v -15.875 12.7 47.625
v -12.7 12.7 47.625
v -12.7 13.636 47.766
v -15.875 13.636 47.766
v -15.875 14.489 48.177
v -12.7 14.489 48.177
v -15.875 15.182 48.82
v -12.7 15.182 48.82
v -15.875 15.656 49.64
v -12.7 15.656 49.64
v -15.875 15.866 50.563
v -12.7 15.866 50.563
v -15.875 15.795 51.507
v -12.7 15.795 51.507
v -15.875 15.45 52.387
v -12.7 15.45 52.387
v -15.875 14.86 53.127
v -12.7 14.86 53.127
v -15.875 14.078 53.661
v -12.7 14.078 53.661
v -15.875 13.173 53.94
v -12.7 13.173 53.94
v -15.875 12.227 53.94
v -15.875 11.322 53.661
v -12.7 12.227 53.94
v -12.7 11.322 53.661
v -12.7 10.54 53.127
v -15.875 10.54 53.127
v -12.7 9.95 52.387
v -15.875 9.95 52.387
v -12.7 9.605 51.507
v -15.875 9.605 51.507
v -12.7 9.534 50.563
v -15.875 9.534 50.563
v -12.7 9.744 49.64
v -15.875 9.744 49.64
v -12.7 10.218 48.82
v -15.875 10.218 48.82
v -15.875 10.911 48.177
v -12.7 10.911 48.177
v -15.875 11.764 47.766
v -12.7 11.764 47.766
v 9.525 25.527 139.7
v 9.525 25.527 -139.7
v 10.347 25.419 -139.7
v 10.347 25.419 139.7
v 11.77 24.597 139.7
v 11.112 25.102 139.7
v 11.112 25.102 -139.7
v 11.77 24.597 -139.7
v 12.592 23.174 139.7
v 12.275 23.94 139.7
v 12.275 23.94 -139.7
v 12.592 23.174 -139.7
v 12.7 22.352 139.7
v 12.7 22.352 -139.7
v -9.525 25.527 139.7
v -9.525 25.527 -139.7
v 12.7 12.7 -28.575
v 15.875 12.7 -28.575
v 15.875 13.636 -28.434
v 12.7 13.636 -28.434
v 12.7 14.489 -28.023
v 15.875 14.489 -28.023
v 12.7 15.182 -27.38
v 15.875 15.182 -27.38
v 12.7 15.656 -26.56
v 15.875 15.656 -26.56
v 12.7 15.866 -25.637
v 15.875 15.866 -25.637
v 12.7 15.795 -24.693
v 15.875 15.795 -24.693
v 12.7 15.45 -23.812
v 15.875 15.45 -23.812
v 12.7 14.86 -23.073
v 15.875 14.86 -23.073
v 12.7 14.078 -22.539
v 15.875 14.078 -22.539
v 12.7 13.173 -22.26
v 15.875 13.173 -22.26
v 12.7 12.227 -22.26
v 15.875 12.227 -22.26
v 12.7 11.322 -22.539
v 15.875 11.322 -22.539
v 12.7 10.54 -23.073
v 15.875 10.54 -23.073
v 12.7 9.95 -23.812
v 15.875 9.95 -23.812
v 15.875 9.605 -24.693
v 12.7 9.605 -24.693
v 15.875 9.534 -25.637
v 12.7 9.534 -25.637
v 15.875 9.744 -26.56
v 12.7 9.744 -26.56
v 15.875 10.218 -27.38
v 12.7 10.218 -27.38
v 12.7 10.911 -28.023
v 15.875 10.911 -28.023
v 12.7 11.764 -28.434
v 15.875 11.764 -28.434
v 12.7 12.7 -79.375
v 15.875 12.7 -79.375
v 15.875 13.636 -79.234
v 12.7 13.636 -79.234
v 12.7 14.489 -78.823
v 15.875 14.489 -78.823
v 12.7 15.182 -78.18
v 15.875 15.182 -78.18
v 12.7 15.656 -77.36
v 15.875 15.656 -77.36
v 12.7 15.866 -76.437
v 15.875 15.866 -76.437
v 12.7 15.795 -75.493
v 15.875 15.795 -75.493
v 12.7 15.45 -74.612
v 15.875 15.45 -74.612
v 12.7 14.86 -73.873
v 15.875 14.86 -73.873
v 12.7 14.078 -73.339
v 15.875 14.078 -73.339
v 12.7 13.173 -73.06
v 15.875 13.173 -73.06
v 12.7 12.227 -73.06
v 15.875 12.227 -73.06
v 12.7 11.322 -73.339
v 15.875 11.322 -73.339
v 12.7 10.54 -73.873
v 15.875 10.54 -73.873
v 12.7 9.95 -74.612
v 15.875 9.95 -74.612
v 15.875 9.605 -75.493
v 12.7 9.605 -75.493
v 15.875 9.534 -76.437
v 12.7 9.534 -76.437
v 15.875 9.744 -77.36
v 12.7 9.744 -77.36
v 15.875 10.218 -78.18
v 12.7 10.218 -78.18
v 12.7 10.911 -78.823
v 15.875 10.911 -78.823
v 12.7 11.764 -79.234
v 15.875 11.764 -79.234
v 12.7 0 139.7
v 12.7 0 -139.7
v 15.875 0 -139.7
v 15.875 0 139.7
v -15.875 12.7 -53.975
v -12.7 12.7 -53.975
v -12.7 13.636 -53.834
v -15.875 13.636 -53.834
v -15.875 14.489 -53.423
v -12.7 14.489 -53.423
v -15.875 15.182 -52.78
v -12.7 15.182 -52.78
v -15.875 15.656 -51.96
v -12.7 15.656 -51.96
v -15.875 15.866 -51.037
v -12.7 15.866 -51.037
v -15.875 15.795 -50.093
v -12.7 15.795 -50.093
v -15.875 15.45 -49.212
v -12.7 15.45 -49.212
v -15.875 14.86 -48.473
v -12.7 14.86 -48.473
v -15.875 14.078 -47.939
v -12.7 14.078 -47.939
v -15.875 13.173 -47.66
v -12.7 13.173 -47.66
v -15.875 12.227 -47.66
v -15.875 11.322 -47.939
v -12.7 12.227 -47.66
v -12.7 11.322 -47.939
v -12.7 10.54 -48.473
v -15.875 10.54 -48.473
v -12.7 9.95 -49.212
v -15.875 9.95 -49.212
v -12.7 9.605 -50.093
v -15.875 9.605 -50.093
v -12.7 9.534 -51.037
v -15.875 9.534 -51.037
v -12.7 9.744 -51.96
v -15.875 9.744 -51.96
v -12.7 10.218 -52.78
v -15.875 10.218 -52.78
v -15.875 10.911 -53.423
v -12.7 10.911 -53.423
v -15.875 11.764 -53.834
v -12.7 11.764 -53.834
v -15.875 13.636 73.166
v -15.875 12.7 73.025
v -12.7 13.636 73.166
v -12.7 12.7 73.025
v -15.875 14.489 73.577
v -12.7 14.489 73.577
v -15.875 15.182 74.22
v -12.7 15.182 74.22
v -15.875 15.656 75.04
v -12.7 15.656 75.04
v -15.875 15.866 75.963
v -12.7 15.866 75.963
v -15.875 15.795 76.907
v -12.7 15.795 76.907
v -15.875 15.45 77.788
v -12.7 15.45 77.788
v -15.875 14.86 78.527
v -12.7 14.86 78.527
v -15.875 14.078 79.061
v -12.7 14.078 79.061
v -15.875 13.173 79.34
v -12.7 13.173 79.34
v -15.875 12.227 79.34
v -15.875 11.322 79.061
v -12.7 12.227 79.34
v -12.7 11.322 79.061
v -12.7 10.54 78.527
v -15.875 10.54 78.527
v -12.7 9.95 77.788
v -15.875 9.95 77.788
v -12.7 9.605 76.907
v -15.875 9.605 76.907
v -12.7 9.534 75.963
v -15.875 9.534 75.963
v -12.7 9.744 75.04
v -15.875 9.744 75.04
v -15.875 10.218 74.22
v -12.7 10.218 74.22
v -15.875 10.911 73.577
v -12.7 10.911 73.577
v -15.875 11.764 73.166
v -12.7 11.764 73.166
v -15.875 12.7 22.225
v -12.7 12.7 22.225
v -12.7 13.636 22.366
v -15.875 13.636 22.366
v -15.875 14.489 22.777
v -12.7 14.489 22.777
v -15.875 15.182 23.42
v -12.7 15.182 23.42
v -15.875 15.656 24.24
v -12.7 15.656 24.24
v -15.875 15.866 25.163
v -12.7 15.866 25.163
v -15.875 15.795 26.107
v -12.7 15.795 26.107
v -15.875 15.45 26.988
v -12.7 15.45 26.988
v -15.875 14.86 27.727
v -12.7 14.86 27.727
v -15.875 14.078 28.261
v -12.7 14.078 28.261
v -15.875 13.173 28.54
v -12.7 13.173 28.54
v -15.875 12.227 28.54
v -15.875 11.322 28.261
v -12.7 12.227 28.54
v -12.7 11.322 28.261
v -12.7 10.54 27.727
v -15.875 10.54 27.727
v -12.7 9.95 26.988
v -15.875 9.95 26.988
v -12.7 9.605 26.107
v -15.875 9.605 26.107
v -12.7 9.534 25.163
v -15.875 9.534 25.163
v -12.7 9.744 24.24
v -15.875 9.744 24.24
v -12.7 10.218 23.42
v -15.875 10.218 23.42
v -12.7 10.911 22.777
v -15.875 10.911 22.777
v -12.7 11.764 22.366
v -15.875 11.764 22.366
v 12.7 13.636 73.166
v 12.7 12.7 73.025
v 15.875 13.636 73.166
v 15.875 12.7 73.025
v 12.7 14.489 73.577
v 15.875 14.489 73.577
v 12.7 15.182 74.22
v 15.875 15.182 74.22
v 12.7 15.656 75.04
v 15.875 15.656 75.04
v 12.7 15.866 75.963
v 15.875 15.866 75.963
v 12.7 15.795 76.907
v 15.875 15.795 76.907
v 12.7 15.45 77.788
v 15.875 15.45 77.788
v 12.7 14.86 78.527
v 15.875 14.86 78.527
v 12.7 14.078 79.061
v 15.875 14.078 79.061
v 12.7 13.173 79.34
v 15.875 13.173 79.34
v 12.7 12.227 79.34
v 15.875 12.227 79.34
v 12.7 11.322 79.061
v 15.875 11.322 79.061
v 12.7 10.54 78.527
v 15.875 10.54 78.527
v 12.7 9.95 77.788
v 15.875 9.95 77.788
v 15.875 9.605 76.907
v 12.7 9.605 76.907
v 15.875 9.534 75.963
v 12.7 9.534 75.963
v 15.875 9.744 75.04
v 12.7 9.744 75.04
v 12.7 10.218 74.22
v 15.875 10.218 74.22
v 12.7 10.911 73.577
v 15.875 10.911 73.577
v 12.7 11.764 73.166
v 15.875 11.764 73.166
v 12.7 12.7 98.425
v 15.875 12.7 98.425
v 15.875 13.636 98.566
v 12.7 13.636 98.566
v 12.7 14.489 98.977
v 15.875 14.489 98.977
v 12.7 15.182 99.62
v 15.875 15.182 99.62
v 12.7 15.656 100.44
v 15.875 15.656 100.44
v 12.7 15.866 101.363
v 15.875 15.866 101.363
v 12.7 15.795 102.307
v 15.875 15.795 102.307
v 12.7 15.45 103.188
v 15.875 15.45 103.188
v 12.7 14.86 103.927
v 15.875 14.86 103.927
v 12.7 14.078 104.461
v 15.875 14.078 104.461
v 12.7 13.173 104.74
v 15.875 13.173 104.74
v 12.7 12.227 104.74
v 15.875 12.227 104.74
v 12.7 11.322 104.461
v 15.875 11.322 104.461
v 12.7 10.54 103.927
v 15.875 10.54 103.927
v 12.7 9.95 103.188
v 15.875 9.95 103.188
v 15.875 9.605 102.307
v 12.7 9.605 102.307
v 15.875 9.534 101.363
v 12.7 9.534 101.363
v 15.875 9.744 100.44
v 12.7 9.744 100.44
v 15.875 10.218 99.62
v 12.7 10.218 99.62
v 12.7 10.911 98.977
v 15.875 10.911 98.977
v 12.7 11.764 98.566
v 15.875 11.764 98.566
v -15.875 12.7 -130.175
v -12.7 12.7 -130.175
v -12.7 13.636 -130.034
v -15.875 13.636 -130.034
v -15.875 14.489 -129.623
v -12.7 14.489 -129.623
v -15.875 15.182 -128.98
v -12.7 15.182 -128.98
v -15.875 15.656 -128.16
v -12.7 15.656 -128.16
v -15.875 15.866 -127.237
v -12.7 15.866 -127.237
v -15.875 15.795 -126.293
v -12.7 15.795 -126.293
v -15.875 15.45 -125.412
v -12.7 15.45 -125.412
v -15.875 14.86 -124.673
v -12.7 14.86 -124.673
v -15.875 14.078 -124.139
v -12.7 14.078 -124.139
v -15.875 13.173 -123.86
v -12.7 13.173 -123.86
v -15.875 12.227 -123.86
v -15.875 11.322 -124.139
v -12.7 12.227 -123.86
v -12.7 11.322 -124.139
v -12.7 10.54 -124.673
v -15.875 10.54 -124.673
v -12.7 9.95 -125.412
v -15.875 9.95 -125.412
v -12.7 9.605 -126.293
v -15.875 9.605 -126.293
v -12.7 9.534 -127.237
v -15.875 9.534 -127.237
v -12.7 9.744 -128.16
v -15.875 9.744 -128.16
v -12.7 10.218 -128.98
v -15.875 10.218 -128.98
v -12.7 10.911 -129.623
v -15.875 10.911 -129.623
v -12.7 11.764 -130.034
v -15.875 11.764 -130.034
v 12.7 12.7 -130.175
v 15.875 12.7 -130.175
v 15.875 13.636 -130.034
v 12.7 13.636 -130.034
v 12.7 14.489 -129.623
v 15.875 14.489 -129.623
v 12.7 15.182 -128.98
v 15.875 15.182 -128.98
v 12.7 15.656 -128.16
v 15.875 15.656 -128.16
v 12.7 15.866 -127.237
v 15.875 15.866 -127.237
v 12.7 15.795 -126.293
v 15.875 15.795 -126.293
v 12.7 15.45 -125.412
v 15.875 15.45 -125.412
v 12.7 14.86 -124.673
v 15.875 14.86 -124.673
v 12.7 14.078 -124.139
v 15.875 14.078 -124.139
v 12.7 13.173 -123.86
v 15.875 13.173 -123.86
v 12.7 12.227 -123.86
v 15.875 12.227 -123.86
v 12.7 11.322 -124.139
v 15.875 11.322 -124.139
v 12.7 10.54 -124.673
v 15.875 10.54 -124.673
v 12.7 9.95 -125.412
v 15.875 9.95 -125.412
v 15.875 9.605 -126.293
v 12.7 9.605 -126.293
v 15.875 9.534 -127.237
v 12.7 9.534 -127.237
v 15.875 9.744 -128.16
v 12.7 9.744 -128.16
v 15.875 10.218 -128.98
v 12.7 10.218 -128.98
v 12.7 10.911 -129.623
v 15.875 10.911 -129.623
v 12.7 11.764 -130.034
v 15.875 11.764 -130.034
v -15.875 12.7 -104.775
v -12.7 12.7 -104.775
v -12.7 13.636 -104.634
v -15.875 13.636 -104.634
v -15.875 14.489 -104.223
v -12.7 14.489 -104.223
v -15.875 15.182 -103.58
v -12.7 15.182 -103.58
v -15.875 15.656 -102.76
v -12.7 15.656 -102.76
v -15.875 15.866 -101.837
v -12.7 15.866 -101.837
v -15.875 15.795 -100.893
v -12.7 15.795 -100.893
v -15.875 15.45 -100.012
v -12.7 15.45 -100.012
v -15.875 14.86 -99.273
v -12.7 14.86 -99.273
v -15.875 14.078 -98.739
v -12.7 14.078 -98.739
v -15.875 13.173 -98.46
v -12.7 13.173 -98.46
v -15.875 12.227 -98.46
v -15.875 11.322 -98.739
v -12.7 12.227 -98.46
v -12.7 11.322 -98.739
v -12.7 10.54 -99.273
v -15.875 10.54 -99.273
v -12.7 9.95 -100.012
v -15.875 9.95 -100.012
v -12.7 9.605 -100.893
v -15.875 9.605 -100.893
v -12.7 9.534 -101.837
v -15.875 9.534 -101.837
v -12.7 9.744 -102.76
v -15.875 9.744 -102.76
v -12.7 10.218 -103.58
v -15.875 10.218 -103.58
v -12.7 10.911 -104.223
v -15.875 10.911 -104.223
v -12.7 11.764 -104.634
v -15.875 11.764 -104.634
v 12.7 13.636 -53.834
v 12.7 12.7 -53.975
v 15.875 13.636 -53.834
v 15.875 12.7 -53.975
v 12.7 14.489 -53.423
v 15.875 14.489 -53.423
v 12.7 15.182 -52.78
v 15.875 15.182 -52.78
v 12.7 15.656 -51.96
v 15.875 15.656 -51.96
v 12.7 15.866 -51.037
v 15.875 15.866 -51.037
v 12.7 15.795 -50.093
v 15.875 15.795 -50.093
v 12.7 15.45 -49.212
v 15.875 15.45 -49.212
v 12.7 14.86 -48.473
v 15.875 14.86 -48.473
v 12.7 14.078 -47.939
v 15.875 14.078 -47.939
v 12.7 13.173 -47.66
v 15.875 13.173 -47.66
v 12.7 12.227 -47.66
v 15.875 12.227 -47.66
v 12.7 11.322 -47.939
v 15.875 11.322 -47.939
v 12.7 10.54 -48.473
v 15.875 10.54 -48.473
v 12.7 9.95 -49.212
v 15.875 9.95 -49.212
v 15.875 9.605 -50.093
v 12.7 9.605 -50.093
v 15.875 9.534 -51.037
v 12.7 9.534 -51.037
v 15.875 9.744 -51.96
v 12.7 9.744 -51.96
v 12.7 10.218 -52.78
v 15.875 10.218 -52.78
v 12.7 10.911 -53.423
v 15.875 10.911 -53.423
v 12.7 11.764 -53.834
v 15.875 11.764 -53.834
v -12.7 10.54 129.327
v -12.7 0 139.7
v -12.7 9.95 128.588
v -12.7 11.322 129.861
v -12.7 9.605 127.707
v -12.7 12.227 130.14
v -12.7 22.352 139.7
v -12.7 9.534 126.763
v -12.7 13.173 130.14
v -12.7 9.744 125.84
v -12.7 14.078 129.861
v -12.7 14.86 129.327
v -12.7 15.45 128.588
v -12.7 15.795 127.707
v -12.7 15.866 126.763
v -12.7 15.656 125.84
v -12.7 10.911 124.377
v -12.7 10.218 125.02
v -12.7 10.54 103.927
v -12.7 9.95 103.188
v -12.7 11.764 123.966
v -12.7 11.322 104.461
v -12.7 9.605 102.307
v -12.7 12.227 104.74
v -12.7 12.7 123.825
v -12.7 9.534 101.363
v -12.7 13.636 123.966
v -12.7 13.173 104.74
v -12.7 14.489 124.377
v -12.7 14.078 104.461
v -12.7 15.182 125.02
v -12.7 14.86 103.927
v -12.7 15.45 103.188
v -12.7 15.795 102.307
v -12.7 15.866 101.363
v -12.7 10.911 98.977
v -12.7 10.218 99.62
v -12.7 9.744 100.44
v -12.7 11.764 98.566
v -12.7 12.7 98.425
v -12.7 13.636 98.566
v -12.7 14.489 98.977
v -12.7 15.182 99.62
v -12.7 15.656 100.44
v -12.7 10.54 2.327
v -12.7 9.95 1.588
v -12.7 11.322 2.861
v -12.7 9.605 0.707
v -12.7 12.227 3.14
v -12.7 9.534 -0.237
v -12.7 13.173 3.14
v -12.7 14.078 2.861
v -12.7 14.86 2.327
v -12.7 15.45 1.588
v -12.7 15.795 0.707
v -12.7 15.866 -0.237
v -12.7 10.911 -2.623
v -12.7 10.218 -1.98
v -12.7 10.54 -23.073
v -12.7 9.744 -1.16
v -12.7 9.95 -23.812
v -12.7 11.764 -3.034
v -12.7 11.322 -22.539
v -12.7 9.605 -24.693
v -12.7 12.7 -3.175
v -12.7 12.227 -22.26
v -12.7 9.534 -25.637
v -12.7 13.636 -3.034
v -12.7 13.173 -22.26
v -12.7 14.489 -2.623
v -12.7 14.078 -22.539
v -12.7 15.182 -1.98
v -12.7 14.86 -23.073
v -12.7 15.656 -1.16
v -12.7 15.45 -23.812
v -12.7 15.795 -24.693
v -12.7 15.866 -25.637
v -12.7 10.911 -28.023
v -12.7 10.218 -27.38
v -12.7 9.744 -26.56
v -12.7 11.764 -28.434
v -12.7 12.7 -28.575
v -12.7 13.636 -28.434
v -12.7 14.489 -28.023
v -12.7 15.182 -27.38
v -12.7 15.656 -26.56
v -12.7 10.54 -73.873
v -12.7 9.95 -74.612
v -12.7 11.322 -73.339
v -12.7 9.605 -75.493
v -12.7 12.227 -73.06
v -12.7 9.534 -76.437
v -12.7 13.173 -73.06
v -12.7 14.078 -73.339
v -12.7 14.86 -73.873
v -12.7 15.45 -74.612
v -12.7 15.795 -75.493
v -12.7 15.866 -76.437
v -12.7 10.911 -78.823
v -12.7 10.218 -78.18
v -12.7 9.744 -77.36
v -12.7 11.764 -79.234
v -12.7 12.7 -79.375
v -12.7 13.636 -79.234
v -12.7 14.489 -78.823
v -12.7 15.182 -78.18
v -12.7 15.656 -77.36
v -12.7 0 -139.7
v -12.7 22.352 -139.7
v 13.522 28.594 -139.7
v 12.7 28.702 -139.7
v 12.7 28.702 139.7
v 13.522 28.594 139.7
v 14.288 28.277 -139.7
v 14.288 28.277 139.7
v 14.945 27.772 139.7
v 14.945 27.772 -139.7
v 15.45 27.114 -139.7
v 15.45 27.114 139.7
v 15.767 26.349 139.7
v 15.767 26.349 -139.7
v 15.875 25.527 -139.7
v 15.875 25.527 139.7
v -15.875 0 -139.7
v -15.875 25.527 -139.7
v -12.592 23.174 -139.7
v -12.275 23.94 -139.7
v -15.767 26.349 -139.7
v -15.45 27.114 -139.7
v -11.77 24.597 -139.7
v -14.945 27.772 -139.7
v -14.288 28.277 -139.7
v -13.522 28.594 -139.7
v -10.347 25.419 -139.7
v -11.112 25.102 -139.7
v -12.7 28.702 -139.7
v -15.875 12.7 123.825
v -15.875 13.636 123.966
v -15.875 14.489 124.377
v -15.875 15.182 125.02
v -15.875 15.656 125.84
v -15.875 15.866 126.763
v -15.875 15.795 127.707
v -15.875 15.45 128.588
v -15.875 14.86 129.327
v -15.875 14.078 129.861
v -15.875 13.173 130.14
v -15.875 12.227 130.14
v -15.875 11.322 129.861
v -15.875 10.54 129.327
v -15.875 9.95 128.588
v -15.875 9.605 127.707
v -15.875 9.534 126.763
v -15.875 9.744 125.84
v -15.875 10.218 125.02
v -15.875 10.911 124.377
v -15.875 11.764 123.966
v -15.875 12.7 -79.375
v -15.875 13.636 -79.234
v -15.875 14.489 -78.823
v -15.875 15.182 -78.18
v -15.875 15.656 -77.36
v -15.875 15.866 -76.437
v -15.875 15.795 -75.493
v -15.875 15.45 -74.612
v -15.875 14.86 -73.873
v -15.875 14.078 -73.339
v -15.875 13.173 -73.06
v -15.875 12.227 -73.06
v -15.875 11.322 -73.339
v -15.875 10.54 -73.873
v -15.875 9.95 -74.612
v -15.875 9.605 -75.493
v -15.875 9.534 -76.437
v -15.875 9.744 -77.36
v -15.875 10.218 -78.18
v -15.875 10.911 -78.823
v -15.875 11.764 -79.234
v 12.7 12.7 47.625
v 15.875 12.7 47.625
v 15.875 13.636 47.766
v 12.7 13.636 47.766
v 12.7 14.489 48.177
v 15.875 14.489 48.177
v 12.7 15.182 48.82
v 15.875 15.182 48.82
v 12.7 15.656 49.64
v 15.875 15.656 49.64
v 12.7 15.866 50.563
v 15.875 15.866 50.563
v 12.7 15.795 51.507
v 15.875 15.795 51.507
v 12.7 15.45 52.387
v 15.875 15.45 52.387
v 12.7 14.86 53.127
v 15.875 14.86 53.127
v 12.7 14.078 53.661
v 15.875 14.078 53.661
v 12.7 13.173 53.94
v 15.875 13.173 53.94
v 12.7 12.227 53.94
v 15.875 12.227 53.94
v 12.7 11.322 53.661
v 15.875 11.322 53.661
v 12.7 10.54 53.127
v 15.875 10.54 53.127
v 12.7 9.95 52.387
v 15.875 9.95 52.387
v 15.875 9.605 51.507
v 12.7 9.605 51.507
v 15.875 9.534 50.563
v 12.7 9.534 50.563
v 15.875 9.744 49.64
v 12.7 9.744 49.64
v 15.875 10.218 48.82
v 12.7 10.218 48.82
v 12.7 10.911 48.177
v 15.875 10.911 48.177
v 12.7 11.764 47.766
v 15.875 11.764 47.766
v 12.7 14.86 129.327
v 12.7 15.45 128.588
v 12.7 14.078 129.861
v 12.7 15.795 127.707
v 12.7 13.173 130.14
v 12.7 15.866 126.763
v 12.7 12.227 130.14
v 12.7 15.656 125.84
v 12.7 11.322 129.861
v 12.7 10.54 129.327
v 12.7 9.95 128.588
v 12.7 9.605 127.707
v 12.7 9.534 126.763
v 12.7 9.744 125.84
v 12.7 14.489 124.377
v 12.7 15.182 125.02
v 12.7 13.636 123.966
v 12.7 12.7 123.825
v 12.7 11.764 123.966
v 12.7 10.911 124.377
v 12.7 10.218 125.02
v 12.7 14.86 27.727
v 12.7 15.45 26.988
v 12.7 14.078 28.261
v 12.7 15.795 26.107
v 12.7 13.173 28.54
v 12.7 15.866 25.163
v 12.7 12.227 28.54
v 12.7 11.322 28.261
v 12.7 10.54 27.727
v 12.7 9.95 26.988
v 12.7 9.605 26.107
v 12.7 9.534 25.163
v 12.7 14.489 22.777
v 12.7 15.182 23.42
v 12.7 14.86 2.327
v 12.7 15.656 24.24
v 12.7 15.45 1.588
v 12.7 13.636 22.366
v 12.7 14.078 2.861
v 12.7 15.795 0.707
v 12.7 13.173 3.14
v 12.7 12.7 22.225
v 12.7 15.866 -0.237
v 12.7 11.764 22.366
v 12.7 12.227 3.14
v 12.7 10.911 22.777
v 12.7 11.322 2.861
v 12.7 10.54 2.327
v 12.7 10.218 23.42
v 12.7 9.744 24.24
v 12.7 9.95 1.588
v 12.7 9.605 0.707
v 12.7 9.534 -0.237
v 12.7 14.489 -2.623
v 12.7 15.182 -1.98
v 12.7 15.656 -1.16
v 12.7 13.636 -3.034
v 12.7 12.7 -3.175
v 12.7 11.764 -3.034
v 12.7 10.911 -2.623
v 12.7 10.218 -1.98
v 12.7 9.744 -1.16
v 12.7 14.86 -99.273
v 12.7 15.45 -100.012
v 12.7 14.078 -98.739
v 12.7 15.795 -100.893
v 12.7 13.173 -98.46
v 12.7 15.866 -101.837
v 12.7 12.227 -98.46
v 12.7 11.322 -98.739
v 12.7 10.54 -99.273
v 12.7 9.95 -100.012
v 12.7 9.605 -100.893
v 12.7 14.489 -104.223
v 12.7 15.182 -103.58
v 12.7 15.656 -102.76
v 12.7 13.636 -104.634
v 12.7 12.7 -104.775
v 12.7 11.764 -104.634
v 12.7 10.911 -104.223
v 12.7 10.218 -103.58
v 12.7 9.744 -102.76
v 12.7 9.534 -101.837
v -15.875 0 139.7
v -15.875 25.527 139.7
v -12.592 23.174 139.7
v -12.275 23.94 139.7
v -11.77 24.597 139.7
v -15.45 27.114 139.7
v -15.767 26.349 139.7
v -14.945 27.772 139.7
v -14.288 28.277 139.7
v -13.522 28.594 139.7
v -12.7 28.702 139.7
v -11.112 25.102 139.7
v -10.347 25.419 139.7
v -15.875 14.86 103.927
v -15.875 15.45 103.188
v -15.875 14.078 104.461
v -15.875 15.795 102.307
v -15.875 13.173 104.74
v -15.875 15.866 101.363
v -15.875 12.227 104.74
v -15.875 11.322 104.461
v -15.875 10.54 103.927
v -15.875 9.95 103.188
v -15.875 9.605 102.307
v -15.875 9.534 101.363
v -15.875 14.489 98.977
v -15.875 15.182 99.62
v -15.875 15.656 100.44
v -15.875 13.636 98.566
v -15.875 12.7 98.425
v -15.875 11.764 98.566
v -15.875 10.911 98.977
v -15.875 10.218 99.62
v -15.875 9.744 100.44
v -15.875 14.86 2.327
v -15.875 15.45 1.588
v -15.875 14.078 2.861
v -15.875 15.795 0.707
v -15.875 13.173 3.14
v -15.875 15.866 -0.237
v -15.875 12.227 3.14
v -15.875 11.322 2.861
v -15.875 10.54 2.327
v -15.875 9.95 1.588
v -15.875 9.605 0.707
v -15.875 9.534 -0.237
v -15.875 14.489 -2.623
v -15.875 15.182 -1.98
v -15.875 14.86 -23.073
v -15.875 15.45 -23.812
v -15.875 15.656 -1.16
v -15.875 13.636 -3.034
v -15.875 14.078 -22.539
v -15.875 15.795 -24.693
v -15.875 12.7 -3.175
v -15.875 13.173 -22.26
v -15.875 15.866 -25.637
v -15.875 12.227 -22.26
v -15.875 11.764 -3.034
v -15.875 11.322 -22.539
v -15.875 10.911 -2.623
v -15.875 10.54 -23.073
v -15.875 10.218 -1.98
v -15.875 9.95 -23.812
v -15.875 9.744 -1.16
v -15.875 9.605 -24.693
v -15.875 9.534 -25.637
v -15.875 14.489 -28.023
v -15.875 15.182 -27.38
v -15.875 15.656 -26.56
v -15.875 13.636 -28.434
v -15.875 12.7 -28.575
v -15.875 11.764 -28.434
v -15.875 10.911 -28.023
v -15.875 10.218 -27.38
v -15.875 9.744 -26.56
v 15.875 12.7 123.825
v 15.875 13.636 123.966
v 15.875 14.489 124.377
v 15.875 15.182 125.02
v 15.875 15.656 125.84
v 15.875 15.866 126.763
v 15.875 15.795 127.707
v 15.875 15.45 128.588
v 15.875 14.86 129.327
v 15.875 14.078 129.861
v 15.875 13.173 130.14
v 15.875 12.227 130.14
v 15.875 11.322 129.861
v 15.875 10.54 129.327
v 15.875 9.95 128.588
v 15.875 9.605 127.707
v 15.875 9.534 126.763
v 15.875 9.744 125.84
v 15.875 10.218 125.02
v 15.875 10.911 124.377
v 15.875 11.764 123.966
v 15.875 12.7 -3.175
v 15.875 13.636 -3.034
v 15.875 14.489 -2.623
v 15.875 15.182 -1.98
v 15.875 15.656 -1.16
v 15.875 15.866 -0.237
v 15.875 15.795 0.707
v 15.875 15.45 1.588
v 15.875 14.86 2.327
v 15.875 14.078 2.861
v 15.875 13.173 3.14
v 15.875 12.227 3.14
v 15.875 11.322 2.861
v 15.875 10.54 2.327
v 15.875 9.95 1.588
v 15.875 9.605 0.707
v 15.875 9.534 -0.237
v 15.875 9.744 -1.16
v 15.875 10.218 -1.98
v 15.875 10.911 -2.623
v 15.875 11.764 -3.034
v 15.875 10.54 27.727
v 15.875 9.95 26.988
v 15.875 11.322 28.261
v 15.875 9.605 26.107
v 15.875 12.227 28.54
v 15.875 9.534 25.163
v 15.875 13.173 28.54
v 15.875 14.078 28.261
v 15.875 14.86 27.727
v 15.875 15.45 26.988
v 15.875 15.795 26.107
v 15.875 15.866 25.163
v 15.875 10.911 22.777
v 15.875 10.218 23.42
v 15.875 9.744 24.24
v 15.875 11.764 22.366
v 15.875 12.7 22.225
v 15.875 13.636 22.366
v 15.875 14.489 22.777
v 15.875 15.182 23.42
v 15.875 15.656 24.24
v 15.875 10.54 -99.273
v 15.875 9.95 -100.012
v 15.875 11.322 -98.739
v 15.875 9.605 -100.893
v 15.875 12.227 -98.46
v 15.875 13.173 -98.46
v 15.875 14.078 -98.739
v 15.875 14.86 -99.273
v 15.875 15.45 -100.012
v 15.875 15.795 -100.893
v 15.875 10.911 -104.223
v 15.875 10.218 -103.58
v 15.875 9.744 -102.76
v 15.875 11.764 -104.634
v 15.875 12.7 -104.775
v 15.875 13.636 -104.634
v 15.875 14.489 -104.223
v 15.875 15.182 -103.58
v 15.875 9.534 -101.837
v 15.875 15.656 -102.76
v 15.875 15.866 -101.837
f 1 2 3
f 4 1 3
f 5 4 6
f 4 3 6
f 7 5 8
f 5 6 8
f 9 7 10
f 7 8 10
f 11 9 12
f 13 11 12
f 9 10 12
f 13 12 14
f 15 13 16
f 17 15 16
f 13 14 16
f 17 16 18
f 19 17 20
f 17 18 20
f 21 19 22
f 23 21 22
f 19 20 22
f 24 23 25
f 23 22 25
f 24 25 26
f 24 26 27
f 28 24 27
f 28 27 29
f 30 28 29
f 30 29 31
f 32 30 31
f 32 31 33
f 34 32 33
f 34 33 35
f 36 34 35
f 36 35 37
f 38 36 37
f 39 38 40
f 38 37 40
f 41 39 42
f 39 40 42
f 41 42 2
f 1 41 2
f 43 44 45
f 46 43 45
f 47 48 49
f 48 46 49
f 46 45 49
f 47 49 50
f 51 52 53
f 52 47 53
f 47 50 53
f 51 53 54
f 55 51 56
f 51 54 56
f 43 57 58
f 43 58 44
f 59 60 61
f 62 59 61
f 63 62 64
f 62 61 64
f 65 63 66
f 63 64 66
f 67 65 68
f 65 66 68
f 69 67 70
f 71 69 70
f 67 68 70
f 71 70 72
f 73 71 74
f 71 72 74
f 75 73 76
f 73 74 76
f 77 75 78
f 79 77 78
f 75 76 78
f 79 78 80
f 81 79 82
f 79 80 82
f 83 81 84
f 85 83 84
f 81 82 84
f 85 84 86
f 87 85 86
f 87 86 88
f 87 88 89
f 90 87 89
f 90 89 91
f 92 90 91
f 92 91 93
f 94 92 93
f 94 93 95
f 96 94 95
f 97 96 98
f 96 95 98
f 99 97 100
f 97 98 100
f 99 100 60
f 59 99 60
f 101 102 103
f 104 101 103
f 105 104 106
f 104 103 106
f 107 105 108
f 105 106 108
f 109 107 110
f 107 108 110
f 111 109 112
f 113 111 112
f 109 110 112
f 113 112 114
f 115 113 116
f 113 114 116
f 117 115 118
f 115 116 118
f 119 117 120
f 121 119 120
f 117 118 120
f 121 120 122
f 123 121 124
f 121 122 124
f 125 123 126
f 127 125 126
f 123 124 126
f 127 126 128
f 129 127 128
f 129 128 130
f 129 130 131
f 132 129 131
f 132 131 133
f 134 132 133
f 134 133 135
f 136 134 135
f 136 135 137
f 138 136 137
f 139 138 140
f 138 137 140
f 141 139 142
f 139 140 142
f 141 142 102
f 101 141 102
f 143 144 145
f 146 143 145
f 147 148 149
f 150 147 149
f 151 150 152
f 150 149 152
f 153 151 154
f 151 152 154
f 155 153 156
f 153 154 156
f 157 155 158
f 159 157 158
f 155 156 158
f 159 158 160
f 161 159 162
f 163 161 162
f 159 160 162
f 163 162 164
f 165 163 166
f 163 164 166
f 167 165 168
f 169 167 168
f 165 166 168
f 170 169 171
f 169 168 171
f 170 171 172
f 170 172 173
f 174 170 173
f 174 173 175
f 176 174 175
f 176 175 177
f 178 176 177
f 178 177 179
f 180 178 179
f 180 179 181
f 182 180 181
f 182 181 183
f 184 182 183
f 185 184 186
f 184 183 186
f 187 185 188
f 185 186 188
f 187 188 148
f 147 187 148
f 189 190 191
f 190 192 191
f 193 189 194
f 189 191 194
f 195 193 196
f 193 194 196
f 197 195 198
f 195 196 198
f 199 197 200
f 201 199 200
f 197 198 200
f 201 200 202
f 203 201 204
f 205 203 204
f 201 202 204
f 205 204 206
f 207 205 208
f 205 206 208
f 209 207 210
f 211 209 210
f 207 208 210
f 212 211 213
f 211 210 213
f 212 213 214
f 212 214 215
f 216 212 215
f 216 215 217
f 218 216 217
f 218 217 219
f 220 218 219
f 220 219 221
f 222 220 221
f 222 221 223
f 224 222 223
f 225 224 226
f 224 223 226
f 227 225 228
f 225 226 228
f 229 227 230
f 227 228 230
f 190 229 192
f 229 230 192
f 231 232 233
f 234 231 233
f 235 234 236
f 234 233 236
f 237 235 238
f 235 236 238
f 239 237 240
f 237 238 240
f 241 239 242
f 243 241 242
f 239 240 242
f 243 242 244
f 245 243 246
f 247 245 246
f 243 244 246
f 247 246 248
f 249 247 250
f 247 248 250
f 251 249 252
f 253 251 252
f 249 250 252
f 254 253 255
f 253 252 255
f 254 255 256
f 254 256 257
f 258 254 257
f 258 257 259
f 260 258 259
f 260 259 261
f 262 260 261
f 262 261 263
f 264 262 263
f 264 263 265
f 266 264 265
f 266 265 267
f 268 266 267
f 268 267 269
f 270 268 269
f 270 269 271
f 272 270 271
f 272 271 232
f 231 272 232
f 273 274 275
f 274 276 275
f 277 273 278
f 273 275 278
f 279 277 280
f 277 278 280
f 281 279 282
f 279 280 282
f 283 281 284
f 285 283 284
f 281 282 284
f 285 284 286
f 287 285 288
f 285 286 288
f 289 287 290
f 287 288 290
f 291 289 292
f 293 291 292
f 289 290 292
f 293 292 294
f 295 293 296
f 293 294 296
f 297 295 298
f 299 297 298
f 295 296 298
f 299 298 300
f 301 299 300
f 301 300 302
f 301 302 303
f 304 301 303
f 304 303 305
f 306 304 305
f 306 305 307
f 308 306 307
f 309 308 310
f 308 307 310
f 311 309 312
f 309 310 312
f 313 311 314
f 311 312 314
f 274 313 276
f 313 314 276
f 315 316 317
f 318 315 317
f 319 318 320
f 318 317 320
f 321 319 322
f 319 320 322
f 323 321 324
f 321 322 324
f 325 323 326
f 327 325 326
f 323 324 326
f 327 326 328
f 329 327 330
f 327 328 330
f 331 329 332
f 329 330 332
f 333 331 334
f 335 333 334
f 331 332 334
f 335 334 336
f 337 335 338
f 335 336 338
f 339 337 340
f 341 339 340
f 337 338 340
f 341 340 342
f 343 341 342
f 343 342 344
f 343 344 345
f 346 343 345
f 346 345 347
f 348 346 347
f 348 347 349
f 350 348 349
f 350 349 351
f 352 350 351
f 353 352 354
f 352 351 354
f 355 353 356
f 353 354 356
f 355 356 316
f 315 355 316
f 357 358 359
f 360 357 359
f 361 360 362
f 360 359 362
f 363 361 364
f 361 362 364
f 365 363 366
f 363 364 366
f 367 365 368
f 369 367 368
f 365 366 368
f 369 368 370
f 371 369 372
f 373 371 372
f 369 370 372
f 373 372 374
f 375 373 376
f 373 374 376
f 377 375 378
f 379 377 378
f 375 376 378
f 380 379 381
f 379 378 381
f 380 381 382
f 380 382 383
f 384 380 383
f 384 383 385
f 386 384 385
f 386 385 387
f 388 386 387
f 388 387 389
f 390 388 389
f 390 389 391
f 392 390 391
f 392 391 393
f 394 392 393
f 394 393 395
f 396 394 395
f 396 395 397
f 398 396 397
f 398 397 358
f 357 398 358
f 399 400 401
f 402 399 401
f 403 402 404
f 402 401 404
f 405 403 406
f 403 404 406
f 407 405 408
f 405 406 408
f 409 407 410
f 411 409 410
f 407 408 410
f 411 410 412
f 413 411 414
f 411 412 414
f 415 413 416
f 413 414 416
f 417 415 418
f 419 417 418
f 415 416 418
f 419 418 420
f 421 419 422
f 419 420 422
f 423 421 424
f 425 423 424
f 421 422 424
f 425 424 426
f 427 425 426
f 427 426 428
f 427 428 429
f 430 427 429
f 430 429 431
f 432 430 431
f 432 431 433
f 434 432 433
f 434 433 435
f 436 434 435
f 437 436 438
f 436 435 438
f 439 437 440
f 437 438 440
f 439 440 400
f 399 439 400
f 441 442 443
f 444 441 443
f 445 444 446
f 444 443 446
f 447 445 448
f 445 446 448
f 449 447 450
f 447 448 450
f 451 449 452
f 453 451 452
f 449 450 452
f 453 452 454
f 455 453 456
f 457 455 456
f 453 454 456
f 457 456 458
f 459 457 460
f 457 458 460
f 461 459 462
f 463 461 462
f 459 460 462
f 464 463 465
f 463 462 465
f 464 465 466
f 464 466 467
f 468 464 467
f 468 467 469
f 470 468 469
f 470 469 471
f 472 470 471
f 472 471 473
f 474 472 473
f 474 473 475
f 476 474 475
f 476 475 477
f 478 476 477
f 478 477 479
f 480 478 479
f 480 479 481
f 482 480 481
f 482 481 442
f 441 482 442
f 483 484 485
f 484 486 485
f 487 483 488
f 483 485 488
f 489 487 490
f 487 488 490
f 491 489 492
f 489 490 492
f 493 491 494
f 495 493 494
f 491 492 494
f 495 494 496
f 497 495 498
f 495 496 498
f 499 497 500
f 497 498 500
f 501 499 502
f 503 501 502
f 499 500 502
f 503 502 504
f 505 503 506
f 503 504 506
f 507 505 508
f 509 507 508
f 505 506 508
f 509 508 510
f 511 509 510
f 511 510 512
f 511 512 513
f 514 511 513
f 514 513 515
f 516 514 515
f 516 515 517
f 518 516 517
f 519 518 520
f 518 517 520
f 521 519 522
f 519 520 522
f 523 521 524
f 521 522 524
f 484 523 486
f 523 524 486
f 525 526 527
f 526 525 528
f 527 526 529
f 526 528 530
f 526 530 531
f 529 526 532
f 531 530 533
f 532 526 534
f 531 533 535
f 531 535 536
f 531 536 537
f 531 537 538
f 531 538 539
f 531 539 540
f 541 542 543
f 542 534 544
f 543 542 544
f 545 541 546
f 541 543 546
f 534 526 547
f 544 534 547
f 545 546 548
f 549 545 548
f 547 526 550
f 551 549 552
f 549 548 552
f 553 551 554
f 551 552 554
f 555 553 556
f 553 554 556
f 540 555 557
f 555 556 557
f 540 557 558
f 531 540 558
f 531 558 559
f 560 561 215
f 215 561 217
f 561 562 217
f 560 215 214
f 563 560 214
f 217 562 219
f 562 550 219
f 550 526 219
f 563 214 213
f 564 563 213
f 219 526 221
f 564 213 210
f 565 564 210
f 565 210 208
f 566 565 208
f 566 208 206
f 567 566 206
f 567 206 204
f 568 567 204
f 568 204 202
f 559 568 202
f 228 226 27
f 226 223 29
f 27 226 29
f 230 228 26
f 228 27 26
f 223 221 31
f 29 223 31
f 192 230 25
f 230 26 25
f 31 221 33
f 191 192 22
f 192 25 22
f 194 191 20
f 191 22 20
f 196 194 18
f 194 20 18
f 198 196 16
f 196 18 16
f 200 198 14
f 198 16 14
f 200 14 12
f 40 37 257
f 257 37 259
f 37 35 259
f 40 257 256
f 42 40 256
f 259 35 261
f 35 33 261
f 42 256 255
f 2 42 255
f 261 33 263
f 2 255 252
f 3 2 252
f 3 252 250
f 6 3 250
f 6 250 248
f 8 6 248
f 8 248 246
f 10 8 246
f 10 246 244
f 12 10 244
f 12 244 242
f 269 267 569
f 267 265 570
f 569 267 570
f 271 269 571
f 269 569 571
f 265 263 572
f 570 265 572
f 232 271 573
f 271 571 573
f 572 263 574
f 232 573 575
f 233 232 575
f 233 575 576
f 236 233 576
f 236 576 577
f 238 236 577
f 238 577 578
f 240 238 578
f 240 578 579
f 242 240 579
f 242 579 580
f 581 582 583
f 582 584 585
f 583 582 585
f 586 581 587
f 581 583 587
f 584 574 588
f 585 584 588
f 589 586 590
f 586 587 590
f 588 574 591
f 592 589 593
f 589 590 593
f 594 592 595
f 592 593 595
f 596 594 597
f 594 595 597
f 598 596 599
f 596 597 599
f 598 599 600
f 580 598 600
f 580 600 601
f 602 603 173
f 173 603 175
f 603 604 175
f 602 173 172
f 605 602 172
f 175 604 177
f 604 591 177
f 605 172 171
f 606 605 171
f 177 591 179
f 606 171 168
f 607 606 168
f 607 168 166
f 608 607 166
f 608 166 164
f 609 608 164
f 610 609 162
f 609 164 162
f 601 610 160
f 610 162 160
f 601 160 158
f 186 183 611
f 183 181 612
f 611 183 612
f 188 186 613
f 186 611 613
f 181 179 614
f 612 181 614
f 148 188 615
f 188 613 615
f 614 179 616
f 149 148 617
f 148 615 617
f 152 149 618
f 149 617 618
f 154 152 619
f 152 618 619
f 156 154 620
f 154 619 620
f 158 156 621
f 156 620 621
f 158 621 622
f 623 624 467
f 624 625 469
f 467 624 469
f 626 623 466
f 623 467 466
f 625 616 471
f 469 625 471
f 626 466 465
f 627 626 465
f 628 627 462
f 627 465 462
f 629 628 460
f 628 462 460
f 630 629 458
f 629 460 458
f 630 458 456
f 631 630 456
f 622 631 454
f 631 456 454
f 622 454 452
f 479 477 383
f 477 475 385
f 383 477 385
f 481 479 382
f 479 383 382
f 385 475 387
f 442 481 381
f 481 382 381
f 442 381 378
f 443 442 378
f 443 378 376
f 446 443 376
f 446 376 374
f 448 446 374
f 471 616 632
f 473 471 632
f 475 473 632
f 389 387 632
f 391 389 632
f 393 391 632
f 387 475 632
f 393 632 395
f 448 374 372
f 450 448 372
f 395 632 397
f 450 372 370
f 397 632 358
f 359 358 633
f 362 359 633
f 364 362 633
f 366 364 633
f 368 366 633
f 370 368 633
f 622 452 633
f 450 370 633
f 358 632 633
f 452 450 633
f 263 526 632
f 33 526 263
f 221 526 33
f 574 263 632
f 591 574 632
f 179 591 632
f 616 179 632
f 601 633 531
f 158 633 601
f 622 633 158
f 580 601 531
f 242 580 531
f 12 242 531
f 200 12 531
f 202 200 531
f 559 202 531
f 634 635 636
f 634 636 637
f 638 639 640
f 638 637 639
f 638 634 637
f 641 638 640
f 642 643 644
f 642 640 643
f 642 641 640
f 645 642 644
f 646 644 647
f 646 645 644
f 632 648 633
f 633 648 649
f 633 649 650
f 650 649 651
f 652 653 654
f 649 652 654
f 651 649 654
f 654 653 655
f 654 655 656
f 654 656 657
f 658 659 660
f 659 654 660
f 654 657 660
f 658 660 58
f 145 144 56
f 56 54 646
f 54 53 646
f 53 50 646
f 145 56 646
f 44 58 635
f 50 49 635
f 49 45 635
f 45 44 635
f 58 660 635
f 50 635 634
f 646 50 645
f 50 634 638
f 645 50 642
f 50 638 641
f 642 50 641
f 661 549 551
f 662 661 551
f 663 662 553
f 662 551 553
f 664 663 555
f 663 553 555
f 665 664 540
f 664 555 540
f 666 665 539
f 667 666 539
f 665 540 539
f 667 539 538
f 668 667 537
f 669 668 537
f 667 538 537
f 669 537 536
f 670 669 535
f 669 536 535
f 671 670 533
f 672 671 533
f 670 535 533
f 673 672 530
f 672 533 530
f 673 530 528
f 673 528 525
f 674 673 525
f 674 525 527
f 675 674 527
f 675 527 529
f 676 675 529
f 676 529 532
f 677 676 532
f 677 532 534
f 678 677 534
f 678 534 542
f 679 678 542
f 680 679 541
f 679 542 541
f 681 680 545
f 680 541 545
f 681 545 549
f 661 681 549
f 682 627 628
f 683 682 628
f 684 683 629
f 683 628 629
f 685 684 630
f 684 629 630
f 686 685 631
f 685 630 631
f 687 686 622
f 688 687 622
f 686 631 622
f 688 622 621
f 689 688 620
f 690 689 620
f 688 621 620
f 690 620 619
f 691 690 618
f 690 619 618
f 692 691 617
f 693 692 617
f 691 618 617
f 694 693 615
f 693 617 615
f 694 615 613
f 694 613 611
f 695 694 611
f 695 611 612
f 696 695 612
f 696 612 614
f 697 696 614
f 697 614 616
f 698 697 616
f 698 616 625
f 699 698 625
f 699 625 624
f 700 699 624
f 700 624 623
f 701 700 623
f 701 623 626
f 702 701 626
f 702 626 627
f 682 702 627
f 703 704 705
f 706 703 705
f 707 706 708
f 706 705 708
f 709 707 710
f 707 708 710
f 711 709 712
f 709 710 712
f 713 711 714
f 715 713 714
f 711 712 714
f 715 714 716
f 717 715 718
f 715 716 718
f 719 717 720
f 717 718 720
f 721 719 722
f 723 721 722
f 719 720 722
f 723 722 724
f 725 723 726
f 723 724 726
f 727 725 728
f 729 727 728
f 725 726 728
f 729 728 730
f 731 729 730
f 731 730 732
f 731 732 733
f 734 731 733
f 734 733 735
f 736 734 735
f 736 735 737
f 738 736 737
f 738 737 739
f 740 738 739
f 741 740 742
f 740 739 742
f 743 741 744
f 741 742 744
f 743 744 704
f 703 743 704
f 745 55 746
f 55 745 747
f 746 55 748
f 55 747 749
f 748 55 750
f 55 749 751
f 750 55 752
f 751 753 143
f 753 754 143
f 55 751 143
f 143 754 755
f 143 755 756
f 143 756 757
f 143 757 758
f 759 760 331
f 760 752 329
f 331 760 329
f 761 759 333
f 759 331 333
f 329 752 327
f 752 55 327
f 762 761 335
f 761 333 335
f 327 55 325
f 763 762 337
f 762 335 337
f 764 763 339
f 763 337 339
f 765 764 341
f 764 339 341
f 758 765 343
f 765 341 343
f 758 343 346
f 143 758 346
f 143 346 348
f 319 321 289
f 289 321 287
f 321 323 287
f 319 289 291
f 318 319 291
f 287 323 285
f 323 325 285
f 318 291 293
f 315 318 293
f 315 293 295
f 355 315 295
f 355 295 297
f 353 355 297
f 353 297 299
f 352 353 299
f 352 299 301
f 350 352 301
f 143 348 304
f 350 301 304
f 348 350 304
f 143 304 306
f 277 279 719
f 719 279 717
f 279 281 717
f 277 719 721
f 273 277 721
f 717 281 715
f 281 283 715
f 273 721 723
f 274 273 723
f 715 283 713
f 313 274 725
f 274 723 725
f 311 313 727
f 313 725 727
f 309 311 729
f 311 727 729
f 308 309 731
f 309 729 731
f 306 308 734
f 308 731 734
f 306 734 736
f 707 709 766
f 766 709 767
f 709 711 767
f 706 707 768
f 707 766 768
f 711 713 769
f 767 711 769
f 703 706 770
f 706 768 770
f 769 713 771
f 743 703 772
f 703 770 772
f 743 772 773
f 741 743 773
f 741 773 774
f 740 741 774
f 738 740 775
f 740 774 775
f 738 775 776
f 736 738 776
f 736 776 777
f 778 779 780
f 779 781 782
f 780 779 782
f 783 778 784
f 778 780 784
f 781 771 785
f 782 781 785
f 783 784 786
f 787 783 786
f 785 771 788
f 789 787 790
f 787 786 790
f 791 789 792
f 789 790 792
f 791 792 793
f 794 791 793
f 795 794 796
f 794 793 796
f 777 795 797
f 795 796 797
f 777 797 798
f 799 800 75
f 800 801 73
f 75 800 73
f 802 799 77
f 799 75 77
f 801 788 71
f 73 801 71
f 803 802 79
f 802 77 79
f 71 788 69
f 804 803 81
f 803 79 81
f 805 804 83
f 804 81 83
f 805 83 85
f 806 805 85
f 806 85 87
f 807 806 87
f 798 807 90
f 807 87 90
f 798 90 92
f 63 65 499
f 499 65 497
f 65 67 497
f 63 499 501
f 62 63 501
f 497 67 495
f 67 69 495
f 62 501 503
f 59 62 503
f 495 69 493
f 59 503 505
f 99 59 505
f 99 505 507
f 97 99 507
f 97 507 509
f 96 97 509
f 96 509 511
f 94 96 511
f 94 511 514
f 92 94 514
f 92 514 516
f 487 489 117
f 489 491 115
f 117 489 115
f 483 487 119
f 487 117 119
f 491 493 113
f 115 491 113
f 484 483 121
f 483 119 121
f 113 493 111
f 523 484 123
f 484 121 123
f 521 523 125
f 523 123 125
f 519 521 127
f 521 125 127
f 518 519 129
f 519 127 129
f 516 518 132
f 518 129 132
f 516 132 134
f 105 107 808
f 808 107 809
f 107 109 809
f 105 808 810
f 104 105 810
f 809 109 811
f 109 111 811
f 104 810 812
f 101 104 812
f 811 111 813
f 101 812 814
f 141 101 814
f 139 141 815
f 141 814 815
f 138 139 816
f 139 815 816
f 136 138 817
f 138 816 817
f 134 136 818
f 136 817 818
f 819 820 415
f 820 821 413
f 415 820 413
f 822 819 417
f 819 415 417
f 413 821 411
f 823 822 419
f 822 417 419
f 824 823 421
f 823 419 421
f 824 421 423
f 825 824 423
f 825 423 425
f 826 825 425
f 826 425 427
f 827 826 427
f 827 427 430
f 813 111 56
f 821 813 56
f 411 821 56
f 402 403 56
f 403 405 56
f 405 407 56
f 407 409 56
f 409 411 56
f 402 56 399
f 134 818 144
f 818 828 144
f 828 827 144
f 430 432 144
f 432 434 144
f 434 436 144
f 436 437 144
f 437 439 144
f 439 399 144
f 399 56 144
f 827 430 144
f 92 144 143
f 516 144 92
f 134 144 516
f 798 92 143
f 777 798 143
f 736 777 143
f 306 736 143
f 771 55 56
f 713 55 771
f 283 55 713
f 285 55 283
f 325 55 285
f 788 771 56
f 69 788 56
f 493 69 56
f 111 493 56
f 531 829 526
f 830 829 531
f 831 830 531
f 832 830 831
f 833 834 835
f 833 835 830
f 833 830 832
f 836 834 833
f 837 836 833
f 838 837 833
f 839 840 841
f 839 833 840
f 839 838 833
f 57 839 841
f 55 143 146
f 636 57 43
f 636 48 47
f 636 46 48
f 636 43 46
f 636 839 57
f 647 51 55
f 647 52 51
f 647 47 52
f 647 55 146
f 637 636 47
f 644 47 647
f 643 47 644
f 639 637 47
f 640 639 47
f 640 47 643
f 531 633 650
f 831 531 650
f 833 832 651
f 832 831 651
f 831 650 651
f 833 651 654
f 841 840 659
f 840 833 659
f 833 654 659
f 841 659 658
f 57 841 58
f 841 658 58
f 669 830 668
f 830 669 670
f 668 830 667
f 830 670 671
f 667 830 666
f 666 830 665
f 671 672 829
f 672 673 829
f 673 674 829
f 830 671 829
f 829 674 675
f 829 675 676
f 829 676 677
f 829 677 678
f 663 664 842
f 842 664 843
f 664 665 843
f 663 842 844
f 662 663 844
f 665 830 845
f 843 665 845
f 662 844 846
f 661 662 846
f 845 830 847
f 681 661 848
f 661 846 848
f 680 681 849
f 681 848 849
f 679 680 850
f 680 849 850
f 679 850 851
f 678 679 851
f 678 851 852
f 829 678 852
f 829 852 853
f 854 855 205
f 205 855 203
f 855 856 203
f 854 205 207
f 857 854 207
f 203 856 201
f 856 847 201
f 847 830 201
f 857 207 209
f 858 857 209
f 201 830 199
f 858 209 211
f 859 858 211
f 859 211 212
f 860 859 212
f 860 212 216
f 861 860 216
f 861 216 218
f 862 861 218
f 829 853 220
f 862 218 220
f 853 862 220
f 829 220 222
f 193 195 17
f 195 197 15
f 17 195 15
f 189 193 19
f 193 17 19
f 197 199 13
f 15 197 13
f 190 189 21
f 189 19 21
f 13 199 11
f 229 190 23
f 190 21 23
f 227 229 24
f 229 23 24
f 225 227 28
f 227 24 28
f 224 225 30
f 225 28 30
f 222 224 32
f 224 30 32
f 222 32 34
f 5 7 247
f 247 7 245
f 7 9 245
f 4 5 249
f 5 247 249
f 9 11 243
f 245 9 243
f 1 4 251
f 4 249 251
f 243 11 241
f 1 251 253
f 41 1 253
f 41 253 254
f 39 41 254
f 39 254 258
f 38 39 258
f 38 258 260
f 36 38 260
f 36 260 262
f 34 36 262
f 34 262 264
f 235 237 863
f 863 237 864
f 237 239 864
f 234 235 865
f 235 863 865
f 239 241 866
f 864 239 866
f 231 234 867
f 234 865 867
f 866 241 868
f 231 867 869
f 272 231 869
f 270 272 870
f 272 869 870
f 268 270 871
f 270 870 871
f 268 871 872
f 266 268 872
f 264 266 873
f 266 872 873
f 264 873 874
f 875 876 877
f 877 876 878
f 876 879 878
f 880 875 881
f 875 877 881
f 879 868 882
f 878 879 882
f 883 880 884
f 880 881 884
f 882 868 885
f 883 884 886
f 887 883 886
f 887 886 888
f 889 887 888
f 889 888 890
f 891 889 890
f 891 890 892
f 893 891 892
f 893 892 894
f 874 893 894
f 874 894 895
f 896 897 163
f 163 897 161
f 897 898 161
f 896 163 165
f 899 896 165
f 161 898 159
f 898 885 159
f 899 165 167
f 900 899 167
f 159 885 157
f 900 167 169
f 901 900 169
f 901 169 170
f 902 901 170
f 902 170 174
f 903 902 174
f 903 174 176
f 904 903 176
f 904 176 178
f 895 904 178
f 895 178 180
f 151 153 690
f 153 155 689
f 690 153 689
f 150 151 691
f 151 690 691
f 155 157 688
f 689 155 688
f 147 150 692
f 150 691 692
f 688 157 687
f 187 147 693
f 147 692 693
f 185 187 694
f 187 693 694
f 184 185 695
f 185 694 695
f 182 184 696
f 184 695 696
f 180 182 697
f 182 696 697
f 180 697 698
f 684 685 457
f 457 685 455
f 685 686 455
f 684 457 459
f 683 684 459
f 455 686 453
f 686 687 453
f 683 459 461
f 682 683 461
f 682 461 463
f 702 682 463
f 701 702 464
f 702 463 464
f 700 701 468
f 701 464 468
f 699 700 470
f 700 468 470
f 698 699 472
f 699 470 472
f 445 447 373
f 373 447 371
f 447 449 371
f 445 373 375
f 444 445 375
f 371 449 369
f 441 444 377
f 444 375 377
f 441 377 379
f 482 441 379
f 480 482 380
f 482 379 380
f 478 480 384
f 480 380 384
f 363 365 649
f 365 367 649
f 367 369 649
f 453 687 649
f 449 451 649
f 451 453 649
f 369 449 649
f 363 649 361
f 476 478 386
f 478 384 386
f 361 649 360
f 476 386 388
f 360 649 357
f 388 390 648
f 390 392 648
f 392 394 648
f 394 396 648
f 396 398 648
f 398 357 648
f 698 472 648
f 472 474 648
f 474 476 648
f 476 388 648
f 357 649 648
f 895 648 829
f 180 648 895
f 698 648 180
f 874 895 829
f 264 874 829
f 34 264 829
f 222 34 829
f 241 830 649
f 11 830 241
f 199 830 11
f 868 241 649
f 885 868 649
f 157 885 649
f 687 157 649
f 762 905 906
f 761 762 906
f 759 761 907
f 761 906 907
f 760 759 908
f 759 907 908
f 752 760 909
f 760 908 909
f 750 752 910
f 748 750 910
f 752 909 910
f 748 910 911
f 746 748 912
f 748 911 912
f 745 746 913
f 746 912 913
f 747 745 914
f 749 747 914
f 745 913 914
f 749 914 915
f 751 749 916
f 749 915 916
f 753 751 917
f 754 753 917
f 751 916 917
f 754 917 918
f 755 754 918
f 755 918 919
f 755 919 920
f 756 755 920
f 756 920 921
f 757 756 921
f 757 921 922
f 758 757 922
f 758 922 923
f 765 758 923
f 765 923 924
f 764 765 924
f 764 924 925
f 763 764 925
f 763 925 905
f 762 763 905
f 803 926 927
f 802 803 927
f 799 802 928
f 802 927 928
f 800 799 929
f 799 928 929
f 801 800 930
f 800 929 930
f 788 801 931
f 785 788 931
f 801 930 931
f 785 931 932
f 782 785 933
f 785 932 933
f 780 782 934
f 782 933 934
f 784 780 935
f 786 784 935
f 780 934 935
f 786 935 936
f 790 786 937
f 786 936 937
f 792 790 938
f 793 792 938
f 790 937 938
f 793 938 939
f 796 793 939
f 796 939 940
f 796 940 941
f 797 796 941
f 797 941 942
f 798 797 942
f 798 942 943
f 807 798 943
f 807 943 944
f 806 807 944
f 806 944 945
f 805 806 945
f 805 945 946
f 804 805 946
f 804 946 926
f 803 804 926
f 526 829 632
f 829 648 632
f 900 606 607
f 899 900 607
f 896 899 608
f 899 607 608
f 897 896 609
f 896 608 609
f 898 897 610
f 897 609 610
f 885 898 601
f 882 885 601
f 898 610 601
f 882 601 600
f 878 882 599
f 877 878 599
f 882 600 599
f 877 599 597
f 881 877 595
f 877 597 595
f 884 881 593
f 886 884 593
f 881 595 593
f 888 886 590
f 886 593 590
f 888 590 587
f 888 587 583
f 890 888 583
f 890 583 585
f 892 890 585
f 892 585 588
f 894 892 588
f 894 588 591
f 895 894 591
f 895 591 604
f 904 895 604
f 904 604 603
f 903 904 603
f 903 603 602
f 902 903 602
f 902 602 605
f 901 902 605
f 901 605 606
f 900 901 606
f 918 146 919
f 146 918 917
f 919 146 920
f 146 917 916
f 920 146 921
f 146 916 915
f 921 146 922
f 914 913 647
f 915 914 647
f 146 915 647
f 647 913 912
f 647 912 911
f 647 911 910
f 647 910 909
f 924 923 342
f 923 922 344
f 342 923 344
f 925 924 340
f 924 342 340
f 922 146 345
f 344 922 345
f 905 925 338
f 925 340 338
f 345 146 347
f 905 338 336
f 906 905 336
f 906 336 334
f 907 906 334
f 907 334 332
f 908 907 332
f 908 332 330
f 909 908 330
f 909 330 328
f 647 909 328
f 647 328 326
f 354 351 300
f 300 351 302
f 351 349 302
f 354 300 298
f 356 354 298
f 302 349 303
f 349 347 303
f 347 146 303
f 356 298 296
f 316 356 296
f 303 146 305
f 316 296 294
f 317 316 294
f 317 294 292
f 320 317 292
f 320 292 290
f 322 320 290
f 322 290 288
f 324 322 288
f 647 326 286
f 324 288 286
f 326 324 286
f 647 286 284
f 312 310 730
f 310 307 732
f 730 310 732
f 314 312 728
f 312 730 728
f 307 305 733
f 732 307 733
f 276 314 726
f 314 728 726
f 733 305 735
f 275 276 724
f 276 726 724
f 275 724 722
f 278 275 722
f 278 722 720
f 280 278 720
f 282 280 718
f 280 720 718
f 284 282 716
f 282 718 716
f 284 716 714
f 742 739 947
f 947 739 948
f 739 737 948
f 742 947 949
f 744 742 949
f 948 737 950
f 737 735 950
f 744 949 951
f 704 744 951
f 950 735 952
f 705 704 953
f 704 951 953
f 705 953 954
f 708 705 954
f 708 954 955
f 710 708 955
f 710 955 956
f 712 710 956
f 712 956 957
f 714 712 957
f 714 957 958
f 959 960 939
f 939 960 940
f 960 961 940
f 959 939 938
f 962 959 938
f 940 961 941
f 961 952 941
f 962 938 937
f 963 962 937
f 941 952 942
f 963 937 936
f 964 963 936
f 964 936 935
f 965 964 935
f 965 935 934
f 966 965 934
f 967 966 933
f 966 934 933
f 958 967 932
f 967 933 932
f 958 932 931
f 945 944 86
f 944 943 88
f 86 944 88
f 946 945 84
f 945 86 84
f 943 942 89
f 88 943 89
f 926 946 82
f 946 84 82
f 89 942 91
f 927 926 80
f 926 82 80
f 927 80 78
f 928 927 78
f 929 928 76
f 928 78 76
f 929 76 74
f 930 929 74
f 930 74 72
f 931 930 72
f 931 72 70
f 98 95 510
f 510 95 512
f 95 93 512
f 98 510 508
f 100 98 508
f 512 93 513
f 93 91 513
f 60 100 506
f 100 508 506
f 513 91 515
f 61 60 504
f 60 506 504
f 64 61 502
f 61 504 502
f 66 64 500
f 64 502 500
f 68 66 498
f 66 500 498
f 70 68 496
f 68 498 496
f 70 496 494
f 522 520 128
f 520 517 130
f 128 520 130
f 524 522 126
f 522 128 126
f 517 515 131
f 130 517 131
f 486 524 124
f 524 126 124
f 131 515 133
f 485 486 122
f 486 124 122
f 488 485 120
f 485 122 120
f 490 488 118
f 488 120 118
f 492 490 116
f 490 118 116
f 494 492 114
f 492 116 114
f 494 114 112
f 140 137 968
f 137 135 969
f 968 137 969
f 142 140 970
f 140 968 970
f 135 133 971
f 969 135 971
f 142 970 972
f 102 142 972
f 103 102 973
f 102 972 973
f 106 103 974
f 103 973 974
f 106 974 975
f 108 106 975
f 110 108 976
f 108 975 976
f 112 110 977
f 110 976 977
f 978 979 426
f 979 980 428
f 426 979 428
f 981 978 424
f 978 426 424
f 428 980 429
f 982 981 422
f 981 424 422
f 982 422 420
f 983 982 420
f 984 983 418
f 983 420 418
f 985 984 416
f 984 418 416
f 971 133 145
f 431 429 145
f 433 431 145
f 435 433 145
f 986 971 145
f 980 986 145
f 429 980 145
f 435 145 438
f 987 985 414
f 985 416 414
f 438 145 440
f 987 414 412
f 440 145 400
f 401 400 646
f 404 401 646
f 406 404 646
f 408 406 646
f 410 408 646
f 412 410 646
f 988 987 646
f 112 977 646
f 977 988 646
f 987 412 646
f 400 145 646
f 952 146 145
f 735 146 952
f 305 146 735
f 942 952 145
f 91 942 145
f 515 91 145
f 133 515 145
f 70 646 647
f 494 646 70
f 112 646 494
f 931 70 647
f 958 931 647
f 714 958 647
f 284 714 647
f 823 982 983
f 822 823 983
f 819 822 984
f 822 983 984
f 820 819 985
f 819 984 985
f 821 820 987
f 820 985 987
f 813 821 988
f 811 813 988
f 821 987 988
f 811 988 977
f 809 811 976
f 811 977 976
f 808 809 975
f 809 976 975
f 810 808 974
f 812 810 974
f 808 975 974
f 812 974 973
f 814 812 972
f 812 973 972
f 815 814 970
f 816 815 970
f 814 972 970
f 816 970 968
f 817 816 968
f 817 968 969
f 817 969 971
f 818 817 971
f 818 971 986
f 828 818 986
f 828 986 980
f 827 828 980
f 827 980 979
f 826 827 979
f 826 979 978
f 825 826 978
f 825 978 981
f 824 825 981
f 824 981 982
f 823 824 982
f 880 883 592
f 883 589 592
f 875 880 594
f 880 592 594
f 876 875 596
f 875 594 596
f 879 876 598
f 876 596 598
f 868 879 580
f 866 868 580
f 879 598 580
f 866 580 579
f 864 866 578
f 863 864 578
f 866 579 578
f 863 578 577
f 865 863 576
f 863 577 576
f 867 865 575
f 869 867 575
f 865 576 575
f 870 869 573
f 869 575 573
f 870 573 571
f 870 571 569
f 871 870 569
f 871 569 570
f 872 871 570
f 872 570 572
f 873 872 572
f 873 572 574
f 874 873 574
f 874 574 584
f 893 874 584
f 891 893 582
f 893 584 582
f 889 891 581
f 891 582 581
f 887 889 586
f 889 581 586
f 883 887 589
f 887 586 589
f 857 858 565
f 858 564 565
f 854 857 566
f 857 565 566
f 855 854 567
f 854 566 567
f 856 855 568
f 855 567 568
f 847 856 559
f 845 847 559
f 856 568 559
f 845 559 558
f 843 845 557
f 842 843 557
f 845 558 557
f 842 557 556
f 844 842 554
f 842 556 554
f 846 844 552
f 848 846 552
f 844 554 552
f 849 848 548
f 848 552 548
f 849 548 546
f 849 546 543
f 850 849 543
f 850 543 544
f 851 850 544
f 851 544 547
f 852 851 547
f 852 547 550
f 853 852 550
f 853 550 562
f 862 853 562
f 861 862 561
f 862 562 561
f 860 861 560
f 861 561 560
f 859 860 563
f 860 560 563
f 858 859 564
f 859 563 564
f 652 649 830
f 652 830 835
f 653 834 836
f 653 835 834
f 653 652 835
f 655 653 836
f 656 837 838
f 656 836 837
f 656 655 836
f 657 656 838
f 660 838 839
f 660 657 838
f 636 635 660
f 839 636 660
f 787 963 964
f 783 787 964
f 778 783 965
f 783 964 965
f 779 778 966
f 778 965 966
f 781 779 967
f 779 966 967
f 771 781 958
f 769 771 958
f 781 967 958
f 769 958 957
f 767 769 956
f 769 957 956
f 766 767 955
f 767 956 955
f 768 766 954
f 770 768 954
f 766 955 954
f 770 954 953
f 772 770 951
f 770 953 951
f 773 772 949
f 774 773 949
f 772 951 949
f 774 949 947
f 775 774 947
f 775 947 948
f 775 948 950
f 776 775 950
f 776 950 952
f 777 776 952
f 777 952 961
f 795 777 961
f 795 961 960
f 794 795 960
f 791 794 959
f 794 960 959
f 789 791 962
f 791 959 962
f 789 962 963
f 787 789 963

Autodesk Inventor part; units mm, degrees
ref_plane "YZ Plane" through (0, 0, 0) normal (1, 0, 0) x (0, 1, 0)
ref_plane "XZ Plane" through (0, 0, 0) normal (0, 1, 0) x (-1, 0, 0)
ref_plane "XY Plane" through (0, 0, 0) normal (0, 0, 1) x (1, 0, 0)
sketch "Sketch1" plane through (0, 0, 0) normal (0, 0, 1) x (1, 0, 0)
  line L0 (-15.875, 0) -> (-12.7, 0)
  line L1 (-12.7, 0) -> (-12.7, 22.352)
  line L2 (-9.525, 25.527) -> (9.525, 25.527)
  line L3 (12.7, 22.352) -> (12.7, 0)
  line L4 (12.7, 0) -> (15.875, 0)
  line L5 (15.875, 0) -> (15.875, 25.527)
  line L6 (12.7, 28.702) -> (-12.7, 28.702)
  line L7 (-15.875, 25.527) -> (-15.875, 0)
  arc A0 (-9.525, 25.527) -> (-12.7, 22.352) centre (-9.525, 22.352) ccw
  arc A1 (12.7, 22.352) -> (9.525, 25.527) centre (9.525, 22.352) ccw
  arc A2 (-12.7, 28.702) -> (-15.875, 25.527) centre (-12.7, 25.527) ccw
  arc A3 (15.875, 25.527) -> (12.7, 28.702) centre (12.7, 25.527) ccw
  line L8 (0, 35.2315) -> (0, -5.8719) projected
  point P0 (0, 0)
  dimension "d0" = 28.702
  dimension "d1" = 31.75
  dimension "d2" = 3.175
  dimension "d3" = 3.175
  dimension "d4" = 3.175
extrude "Extrusion1" add sketch "Sketch1" along normal mid plane 279.4
sketch "Sketch4" plane through (15.875, 0, 139.7) normal (1, 0, 0) x (0, 0, -1)
  line L0 (139.7, -5.7404) -> (139.7, 34.4424) construction
  line L1 (-55.88, 0) -> (335.28, 0) construction
  circle A0 centre (139.7, 12.7) radius 3.175
  point P0 (139.7, 0)
  dimension "d34" = 12.7
  dimension "d35" = 0
  dimension "d36" = 6.35
extrude "Extrusion4" cut sketch "Sketch4" against normal up to surface (31.75 mm away)
pattern_linear "Rectangular Pattern3" count 15 spacing 25.4 along (0, 0, 1) count 15 spacing 25.4 along (0, 0, -1) of "Extrusion4"
equation "\"d5\" = TopLength"
equation "\"TopLength\" = 279.4"
properties part number "TopPiece" material "Aluminum 6061"
